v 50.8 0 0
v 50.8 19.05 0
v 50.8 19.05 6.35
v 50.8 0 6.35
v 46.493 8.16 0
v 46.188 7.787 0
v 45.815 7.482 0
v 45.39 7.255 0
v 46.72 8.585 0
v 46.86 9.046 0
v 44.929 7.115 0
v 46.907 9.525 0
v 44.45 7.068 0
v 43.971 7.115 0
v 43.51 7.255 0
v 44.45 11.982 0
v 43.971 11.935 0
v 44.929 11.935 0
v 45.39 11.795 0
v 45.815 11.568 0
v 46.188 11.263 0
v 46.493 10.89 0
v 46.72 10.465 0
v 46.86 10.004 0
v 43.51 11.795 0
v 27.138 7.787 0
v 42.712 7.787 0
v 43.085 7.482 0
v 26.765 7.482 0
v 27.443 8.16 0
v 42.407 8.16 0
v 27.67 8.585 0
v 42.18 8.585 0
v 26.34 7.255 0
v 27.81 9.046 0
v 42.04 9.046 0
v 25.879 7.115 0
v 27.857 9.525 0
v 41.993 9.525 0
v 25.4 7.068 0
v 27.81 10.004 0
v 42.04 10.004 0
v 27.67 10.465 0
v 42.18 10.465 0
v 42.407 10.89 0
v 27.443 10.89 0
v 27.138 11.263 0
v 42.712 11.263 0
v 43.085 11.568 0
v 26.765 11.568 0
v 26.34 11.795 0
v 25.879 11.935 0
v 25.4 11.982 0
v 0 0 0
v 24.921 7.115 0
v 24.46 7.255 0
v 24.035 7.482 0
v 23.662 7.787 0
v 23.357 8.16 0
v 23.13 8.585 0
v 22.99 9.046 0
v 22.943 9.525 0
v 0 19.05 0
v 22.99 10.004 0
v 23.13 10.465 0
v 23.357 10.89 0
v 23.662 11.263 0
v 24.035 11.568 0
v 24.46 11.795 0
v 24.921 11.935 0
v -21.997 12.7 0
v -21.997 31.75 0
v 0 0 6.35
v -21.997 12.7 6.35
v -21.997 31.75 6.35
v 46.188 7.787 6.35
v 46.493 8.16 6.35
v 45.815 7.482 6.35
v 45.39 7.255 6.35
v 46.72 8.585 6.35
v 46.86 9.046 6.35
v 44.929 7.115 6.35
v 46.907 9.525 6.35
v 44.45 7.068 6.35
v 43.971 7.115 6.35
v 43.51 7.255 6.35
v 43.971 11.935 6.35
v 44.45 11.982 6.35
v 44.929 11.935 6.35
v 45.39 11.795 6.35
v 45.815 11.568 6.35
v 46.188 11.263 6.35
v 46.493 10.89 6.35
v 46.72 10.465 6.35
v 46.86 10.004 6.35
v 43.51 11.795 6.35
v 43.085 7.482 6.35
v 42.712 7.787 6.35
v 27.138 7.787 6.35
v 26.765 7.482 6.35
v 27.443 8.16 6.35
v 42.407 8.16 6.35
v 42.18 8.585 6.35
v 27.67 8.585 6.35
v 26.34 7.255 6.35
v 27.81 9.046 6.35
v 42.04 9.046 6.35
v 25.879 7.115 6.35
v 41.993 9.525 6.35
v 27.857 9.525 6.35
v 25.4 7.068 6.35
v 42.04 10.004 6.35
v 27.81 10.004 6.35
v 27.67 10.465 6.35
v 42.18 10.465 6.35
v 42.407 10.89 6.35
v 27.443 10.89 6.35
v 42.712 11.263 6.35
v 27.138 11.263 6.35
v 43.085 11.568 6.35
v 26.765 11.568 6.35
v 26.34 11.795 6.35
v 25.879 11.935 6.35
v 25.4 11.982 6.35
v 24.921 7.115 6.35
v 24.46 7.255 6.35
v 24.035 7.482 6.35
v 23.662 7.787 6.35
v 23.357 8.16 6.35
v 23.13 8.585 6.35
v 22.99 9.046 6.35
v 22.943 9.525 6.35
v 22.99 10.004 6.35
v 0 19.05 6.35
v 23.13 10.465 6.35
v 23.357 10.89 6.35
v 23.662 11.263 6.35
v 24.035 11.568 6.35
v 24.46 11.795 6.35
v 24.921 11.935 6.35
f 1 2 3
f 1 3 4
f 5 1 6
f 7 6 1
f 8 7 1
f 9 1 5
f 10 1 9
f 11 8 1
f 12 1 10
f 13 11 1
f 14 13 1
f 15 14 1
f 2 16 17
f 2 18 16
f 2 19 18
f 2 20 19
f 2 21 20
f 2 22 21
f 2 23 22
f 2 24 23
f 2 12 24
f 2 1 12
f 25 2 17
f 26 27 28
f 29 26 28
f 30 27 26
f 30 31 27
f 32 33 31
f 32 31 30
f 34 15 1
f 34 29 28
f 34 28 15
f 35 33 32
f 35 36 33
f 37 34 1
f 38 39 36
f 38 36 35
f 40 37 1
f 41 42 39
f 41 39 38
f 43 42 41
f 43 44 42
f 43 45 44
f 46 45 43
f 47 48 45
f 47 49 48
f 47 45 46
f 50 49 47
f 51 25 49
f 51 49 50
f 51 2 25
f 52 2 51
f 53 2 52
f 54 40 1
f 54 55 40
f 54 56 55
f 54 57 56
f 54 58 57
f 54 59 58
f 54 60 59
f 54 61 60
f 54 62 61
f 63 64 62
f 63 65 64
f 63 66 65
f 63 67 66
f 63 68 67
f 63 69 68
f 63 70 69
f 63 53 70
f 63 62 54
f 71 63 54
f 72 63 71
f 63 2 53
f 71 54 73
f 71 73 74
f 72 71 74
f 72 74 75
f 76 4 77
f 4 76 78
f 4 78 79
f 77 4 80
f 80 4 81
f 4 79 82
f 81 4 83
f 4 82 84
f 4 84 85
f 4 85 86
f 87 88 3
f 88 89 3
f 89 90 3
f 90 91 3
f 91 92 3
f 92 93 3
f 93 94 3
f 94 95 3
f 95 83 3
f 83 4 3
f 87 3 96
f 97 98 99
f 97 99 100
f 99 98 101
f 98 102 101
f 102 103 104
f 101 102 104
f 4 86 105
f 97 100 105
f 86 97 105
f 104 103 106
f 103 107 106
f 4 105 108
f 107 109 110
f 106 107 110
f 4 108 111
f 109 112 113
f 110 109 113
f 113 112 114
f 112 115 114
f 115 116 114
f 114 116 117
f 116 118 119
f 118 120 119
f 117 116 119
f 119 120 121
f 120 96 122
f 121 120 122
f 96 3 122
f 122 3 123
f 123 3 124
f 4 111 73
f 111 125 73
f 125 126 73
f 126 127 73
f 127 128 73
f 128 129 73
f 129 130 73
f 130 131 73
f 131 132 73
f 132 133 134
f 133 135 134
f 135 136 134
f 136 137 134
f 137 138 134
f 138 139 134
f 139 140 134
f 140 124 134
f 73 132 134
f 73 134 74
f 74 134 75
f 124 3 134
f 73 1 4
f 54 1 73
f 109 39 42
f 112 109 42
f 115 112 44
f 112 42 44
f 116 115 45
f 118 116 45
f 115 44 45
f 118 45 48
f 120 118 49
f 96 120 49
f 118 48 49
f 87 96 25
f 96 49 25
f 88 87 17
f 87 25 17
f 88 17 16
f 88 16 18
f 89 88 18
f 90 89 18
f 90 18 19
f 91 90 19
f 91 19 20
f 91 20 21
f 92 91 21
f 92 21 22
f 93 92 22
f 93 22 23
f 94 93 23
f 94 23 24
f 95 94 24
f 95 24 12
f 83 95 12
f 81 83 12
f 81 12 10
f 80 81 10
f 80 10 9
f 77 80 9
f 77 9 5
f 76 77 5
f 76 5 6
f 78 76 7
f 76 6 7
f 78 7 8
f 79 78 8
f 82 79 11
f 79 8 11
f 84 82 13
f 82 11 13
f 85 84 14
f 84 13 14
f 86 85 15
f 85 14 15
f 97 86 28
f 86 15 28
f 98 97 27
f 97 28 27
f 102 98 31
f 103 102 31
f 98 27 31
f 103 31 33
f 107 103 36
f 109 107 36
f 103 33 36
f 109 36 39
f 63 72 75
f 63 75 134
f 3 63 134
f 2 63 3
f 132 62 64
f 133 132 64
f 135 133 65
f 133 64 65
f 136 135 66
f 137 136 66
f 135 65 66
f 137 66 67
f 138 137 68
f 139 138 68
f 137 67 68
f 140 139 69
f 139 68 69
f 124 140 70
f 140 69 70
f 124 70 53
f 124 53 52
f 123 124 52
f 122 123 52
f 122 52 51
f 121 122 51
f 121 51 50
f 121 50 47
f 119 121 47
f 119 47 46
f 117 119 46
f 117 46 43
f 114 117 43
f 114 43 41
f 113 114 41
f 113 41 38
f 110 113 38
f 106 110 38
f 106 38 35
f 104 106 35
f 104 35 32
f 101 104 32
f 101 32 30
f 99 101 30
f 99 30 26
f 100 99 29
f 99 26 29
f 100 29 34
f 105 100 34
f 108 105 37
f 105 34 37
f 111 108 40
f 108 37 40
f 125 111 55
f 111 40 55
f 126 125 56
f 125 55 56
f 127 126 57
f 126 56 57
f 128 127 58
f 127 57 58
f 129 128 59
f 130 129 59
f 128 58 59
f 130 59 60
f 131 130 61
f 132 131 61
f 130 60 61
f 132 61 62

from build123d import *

# Parameters (mm, degrees)
BOSS_EXTRUDE1_DEPTH          = 6.35
F_10_0_1935_DIAMETER_HOLE1_D = 4.9149


with BuildPart() as part:
    # Sketch1 → Boss-Extrude1 (new body)
    with BuildSketch(Plane.XY):
        Polygon((0, 0), (-21.997045256, 12.7), (-21.997045256, 31.75), (0, 19.05), (50.8, 19.05), (50.8, 0), align=None)
    extrude(amount=BOSS_EXTRUDE1_DEPTH)

    # #10 (0.1935) Diameter Hole1 (through all)
    with Locations(Plane.XY.offset(6.35)):
        with Locations((44.45, 9.525), (25.4, 9.525)):
            Hole(F_10_0_1935_DIAMETER_HOLE1_D / 2)


solid = part.part
